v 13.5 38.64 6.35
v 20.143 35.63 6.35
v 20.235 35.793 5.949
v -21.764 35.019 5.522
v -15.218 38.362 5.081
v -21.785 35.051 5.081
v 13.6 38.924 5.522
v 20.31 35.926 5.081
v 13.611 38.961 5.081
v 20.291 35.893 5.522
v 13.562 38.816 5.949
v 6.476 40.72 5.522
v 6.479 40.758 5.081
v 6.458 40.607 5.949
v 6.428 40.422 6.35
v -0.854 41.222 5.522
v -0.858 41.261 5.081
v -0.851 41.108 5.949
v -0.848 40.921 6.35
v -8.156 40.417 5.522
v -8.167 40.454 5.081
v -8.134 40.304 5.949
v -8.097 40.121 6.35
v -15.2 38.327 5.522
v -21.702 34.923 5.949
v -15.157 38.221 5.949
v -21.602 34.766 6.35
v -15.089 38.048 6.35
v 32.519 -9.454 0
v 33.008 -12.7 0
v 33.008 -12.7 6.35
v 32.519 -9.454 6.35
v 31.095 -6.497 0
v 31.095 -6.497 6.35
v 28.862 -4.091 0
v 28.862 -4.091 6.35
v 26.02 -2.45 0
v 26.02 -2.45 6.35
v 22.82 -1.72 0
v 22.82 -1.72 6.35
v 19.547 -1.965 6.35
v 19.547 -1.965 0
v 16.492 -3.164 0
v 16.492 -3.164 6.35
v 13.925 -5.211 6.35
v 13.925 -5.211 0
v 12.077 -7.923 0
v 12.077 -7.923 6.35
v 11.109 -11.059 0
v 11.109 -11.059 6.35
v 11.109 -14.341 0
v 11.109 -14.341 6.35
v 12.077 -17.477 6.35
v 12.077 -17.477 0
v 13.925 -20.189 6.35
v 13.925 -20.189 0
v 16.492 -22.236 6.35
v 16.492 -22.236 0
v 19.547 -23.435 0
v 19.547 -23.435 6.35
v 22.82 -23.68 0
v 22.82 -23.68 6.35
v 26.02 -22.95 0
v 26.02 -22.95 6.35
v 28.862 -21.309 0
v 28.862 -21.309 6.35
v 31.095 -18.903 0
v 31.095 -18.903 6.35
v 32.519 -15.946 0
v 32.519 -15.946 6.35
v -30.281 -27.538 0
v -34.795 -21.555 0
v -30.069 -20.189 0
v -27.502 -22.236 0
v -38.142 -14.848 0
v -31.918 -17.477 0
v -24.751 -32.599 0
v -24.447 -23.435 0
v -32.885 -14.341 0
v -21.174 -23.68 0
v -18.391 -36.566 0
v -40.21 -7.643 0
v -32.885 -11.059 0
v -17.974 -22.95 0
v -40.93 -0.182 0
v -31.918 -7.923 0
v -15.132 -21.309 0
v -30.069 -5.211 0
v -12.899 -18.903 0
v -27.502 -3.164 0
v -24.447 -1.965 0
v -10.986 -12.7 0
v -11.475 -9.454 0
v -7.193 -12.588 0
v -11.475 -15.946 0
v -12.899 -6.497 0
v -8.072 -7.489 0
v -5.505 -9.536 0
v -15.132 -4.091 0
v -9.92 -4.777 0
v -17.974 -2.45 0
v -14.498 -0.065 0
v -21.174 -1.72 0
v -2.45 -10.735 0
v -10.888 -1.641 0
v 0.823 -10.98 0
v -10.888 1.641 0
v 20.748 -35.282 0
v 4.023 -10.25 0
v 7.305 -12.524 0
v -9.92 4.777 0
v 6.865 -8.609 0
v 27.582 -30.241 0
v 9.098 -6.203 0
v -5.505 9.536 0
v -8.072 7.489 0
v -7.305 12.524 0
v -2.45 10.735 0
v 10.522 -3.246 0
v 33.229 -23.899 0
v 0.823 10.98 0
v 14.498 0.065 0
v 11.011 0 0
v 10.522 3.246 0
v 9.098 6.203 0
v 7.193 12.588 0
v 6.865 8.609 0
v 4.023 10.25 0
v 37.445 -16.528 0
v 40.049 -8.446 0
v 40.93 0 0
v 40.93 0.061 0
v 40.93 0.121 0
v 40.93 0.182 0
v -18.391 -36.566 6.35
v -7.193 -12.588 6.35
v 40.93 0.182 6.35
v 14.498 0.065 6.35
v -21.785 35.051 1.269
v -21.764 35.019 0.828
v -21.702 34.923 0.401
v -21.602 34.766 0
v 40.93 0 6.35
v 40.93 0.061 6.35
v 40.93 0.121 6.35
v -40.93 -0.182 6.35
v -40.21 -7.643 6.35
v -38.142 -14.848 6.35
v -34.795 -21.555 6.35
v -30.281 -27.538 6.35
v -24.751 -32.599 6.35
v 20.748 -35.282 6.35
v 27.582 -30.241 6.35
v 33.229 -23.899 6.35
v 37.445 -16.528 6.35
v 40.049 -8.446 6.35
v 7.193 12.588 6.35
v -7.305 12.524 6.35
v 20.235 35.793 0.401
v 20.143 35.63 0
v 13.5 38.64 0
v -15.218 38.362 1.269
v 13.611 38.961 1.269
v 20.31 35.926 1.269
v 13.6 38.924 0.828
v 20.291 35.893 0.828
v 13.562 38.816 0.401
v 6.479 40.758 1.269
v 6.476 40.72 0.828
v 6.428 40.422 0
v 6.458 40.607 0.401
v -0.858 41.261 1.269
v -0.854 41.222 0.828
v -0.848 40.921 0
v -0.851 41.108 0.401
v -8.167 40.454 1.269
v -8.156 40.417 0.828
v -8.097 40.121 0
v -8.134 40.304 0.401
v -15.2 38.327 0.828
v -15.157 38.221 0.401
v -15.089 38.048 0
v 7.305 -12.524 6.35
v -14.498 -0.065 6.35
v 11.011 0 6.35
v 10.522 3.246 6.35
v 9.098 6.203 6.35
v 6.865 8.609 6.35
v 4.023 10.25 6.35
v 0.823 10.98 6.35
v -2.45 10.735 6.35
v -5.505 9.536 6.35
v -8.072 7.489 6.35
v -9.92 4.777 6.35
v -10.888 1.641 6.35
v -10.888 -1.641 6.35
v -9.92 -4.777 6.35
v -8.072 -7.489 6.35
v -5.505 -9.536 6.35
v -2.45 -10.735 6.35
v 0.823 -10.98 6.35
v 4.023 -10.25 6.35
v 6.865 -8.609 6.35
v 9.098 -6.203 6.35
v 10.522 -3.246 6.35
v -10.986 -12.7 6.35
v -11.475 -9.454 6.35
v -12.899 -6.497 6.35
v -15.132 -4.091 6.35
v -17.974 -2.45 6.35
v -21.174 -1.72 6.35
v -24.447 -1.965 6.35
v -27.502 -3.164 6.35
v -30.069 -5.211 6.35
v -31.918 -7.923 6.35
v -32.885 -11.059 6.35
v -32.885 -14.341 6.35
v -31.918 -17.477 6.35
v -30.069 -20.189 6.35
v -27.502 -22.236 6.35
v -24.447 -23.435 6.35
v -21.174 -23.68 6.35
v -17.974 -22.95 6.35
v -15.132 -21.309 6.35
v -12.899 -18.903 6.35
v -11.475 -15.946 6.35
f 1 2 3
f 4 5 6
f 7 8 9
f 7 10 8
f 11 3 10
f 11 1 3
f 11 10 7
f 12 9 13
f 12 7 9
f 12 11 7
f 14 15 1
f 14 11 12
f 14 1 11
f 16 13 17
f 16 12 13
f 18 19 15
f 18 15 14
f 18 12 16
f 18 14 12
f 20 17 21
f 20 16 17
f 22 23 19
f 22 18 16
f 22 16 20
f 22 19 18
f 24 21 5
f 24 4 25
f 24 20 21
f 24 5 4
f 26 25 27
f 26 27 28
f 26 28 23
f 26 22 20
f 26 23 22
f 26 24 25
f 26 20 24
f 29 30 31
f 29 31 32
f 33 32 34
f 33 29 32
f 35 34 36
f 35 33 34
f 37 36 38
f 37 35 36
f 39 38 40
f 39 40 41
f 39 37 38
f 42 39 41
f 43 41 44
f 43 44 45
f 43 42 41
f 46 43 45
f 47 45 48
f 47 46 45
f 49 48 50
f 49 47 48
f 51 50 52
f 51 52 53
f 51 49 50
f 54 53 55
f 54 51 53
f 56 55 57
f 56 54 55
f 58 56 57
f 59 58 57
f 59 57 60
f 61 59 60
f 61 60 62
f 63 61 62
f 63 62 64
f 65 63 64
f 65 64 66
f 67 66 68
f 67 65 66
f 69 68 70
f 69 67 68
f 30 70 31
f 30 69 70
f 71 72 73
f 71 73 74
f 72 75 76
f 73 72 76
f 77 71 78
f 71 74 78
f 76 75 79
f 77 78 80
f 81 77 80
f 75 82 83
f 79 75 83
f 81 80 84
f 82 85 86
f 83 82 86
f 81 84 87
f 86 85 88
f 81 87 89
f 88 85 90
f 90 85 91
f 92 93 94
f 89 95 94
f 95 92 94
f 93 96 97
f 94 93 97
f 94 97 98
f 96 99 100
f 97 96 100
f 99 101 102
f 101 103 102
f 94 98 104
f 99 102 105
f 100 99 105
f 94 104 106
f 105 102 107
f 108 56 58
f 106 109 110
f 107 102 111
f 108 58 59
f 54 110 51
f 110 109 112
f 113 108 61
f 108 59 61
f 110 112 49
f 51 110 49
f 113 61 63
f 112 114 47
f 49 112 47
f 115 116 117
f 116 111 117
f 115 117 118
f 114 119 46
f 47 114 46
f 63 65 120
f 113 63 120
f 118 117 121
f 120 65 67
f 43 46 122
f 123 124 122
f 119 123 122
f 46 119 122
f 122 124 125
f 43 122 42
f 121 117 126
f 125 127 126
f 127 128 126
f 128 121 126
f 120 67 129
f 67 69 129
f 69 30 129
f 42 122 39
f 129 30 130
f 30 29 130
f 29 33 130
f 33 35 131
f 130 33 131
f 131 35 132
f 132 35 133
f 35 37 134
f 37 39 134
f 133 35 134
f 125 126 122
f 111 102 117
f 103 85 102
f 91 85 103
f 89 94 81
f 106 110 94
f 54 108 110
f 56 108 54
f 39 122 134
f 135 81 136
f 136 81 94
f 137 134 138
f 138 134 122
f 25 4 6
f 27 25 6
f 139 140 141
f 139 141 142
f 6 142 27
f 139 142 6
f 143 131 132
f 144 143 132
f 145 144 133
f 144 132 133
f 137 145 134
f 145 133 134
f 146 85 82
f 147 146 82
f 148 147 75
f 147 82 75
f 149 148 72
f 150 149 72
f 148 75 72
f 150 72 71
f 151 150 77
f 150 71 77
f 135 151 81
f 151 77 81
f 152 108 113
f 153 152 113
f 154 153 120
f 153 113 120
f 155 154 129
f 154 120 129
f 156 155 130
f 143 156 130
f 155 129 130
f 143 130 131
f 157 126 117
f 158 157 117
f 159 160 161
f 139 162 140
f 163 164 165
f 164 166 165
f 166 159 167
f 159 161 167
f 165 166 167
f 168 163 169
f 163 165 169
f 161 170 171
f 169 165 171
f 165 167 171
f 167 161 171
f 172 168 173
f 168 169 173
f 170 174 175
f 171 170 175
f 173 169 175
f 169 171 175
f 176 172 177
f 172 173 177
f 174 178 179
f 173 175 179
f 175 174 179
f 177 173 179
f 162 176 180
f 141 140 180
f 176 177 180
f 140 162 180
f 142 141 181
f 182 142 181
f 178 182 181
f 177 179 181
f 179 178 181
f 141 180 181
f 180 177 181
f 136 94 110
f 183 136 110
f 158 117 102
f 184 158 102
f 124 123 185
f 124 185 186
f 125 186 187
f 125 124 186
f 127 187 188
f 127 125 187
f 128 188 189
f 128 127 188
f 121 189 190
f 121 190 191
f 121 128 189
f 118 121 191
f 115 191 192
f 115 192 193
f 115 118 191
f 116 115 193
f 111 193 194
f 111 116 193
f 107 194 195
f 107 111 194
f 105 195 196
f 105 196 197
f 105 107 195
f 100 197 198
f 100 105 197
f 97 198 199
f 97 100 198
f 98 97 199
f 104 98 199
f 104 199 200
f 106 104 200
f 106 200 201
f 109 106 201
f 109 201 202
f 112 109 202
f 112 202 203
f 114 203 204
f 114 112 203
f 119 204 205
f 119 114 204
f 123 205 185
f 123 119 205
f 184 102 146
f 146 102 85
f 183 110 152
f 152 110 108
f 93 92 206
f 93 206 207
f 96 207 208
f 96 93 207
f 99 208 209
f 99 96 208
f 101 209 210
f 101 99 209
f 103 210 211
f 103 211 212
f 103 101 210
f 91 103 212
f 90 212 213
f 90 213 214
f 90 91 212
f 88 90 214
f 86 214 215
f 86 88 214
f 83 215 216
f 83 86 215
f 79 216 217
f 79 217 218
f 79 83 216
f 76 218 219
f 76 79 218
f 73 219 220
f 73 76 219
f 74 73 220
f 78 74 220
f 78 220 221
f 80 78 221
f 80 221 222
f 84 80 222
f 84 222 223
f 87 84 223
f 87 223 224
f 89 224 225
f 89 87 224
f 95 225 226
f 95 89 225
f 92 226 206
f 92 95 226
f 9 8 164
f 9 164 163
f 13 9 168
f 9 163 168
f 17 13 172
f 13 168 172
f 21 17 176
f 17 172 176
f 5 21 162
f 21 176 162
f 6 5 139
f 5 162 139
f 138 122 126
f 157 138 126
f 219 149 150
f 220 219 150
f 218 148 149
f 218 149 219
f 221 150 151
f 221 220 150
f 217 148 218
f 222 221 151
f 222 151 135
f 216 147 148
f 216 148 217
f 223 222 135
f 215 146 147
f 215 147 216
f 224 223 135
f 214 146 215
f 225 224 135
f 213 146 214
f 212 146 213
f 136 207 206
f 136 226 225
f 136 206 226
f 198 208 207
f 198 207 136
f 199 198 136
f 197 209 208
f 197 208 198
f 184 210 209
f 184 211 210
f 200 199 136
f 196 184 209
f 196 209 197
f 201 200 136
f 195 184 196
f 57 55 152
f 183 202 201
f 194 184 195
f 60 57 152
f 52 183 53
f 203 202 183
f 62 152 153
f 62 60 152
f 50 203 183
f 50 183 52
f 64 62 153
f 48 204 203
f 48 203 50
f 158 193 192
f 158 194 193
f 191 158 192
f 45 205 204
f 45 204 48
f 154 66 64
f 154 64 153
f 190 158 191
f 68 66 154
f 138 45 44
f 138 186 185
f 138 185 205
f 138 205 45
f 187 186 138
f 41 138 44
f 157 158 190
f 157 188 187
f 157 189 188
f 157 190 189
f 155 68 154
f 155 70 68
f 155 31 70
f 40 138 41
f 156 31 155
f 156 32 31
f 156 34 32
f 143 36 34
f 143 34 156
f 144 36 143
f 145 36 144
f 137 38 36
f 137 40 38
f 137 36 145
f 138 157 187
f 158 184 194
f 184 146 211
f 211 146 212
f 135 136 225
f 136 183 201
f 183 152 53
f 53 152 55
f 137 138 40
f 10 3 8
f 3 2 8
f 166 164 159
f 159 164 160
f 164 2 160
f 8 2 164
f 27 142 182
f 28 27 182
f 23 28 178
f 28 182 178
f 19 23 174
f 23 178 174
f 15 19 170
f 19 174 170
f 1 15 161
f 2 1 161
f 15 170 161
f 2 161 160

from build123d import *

# Parameters (mm, degrees)
F0_R        = 11.0109
F1_DEPTH    = 6.35
F2_T2_ANGLE = 70.1504817672
F2_T4_ANGLE = 70.1504817672


# Not quite as in the source:
# - a fillet or chamfer that OpenCascade refuses, or shapes differently, is made with other operations: its cross-section is extruded or revolved along the edge and cut away or added


with BuildPart() as f1:
    # F0 (on Top) → F1 (new body)
    with BuildSketch(Plane.XY):
        Polygon((14.4982038565, 0.0645564188), (7.1931944296, 12.5880910584), (-7.3050094269, 12.5235346396), (-14.4982038565, -0.0645564188), (-7.1931944296, -12.5880910584), (7.3050094269, -12.5235346396), align=None)
        Circle(F0_R, mode=Mode.SUBTRACT)
        with BuildLine():
            Line((-14.4982038565, -0.0645564188), (-40.9298487578, -0.1822490898))
            ThreePointArc((-40.9298487578, -0.1822490898), (-34.7949557319, -21.55450741), (-18.3913751147, -36.565599345))
            Line((-18.3913751147, -36.565599345), (-7.1931944296, -12.5880910584))
            Line((-7.1931944296, -12.5880910584), (-14.4982038565, -0.0645564188))
        make_face()
        with Locations((-21.9970452561, -12.7)):
            Circle(F0_R, mode=Mode.SUBTRACT)
        with BuildLine():
            ThreePointArc((40.9302545077, 0), (40.9301530701, 0.0911247708), (40.9298487578, 0.1822490898))
            Line((40.9298487578, 0.1822490898), (14.4982038565, 0.0645564188))
            Line((14.4982038565, 0.0645564188), (7.3050094269, -12.5235346396))
            Line((7.3050094269, -12.5235346396), (20.7483825964, -35.2815866098))
            ThreePointArc((20.7483825964, -35.2815866098), (35.5283148655, -20.3230060987), (40.9302545077, 0))
        make_face()
        with Locations((21.9970452561, -12.7)):
            Circle(F0_R, mode=Mode.SUBTRACT)
    extrude(amount=F1_DEPTH)


with BuildPart() as f1b:
    # F0 (on Top) → F1, piece 2 (new body)
    with BuildSketch(Plane.XY):
        with BuildLine():
            Line((20.1434729417, 35.6304116159), (20.3098342556, 35.9264168886))
            ThreePointArc((20.3098342556, 35.9264168886), (-0.8576214797, 41.2608929052), (-21.7851331782, 35.0514588904))
            Line((-21.7851331782, 35.0514588904), (-21.6015163476, 34.7657910244))
            ThreePointArc((-21.6015163476, 34.7657910244), (-0.8475640596, 40.921478092), (20.1434729417, 35.6304116159))
        make_face()
    extrude(amount=F1_DEPTH)

    # F2: fillet of radius 2.54 on 2 edges, made by hand

    # F2_s1 → F2_t2 (revolve, cut)
    with BuildSketch(Plane(origin=(0, 0, 0), x_dir=(0, 0, 1), z_dir=(0.8301631357, -0.5575205541, 0))):
        with BuildLine():
            ThreePointArc((1.2687086353, -41.2698049176), (0.6120283322, -41.1834493457), (0, -40.9302545077))
            Line((0, -40.9302545077), (0, -41.2698049176))
            Line((0, -41.2698049176), (1.2687086353, -41.2698049176))
        make_face()
    revolve(axis=Axis((0, 0, 0), (0, 0, 1)), revolution_arc=F2_T2_ANGLE, mode=Mode.SUBTRACT)

    # F2_s3 → F2_t4 (revolve, cut)
    with BuildSketch(Plane(origin=(0, 0, 0), x_dir=(0, 0, 1), z_dir=(0.8301631357, -0.5575205541, 0))):
        with BuildLine():
            ThreePointArc((5.0812913647, -41.2698049176), (5.7379716678, -41.1834493457), (6.35, -40.9302545077))
            Line((6.35, -40.9302545077), (6.35, -41.2698049176))
            Line((6.35, -41.2698049176), (5.0812913647, -41.2698049176))
        make_face()
    revolve(axis=Axis((0, 0, 6.35), (0, 0, 1)), revolution_arc=F2_T4_ANGLE, mode=Mode.SUBTRACT)


solid = Compound([f1.part, f1b.part])
